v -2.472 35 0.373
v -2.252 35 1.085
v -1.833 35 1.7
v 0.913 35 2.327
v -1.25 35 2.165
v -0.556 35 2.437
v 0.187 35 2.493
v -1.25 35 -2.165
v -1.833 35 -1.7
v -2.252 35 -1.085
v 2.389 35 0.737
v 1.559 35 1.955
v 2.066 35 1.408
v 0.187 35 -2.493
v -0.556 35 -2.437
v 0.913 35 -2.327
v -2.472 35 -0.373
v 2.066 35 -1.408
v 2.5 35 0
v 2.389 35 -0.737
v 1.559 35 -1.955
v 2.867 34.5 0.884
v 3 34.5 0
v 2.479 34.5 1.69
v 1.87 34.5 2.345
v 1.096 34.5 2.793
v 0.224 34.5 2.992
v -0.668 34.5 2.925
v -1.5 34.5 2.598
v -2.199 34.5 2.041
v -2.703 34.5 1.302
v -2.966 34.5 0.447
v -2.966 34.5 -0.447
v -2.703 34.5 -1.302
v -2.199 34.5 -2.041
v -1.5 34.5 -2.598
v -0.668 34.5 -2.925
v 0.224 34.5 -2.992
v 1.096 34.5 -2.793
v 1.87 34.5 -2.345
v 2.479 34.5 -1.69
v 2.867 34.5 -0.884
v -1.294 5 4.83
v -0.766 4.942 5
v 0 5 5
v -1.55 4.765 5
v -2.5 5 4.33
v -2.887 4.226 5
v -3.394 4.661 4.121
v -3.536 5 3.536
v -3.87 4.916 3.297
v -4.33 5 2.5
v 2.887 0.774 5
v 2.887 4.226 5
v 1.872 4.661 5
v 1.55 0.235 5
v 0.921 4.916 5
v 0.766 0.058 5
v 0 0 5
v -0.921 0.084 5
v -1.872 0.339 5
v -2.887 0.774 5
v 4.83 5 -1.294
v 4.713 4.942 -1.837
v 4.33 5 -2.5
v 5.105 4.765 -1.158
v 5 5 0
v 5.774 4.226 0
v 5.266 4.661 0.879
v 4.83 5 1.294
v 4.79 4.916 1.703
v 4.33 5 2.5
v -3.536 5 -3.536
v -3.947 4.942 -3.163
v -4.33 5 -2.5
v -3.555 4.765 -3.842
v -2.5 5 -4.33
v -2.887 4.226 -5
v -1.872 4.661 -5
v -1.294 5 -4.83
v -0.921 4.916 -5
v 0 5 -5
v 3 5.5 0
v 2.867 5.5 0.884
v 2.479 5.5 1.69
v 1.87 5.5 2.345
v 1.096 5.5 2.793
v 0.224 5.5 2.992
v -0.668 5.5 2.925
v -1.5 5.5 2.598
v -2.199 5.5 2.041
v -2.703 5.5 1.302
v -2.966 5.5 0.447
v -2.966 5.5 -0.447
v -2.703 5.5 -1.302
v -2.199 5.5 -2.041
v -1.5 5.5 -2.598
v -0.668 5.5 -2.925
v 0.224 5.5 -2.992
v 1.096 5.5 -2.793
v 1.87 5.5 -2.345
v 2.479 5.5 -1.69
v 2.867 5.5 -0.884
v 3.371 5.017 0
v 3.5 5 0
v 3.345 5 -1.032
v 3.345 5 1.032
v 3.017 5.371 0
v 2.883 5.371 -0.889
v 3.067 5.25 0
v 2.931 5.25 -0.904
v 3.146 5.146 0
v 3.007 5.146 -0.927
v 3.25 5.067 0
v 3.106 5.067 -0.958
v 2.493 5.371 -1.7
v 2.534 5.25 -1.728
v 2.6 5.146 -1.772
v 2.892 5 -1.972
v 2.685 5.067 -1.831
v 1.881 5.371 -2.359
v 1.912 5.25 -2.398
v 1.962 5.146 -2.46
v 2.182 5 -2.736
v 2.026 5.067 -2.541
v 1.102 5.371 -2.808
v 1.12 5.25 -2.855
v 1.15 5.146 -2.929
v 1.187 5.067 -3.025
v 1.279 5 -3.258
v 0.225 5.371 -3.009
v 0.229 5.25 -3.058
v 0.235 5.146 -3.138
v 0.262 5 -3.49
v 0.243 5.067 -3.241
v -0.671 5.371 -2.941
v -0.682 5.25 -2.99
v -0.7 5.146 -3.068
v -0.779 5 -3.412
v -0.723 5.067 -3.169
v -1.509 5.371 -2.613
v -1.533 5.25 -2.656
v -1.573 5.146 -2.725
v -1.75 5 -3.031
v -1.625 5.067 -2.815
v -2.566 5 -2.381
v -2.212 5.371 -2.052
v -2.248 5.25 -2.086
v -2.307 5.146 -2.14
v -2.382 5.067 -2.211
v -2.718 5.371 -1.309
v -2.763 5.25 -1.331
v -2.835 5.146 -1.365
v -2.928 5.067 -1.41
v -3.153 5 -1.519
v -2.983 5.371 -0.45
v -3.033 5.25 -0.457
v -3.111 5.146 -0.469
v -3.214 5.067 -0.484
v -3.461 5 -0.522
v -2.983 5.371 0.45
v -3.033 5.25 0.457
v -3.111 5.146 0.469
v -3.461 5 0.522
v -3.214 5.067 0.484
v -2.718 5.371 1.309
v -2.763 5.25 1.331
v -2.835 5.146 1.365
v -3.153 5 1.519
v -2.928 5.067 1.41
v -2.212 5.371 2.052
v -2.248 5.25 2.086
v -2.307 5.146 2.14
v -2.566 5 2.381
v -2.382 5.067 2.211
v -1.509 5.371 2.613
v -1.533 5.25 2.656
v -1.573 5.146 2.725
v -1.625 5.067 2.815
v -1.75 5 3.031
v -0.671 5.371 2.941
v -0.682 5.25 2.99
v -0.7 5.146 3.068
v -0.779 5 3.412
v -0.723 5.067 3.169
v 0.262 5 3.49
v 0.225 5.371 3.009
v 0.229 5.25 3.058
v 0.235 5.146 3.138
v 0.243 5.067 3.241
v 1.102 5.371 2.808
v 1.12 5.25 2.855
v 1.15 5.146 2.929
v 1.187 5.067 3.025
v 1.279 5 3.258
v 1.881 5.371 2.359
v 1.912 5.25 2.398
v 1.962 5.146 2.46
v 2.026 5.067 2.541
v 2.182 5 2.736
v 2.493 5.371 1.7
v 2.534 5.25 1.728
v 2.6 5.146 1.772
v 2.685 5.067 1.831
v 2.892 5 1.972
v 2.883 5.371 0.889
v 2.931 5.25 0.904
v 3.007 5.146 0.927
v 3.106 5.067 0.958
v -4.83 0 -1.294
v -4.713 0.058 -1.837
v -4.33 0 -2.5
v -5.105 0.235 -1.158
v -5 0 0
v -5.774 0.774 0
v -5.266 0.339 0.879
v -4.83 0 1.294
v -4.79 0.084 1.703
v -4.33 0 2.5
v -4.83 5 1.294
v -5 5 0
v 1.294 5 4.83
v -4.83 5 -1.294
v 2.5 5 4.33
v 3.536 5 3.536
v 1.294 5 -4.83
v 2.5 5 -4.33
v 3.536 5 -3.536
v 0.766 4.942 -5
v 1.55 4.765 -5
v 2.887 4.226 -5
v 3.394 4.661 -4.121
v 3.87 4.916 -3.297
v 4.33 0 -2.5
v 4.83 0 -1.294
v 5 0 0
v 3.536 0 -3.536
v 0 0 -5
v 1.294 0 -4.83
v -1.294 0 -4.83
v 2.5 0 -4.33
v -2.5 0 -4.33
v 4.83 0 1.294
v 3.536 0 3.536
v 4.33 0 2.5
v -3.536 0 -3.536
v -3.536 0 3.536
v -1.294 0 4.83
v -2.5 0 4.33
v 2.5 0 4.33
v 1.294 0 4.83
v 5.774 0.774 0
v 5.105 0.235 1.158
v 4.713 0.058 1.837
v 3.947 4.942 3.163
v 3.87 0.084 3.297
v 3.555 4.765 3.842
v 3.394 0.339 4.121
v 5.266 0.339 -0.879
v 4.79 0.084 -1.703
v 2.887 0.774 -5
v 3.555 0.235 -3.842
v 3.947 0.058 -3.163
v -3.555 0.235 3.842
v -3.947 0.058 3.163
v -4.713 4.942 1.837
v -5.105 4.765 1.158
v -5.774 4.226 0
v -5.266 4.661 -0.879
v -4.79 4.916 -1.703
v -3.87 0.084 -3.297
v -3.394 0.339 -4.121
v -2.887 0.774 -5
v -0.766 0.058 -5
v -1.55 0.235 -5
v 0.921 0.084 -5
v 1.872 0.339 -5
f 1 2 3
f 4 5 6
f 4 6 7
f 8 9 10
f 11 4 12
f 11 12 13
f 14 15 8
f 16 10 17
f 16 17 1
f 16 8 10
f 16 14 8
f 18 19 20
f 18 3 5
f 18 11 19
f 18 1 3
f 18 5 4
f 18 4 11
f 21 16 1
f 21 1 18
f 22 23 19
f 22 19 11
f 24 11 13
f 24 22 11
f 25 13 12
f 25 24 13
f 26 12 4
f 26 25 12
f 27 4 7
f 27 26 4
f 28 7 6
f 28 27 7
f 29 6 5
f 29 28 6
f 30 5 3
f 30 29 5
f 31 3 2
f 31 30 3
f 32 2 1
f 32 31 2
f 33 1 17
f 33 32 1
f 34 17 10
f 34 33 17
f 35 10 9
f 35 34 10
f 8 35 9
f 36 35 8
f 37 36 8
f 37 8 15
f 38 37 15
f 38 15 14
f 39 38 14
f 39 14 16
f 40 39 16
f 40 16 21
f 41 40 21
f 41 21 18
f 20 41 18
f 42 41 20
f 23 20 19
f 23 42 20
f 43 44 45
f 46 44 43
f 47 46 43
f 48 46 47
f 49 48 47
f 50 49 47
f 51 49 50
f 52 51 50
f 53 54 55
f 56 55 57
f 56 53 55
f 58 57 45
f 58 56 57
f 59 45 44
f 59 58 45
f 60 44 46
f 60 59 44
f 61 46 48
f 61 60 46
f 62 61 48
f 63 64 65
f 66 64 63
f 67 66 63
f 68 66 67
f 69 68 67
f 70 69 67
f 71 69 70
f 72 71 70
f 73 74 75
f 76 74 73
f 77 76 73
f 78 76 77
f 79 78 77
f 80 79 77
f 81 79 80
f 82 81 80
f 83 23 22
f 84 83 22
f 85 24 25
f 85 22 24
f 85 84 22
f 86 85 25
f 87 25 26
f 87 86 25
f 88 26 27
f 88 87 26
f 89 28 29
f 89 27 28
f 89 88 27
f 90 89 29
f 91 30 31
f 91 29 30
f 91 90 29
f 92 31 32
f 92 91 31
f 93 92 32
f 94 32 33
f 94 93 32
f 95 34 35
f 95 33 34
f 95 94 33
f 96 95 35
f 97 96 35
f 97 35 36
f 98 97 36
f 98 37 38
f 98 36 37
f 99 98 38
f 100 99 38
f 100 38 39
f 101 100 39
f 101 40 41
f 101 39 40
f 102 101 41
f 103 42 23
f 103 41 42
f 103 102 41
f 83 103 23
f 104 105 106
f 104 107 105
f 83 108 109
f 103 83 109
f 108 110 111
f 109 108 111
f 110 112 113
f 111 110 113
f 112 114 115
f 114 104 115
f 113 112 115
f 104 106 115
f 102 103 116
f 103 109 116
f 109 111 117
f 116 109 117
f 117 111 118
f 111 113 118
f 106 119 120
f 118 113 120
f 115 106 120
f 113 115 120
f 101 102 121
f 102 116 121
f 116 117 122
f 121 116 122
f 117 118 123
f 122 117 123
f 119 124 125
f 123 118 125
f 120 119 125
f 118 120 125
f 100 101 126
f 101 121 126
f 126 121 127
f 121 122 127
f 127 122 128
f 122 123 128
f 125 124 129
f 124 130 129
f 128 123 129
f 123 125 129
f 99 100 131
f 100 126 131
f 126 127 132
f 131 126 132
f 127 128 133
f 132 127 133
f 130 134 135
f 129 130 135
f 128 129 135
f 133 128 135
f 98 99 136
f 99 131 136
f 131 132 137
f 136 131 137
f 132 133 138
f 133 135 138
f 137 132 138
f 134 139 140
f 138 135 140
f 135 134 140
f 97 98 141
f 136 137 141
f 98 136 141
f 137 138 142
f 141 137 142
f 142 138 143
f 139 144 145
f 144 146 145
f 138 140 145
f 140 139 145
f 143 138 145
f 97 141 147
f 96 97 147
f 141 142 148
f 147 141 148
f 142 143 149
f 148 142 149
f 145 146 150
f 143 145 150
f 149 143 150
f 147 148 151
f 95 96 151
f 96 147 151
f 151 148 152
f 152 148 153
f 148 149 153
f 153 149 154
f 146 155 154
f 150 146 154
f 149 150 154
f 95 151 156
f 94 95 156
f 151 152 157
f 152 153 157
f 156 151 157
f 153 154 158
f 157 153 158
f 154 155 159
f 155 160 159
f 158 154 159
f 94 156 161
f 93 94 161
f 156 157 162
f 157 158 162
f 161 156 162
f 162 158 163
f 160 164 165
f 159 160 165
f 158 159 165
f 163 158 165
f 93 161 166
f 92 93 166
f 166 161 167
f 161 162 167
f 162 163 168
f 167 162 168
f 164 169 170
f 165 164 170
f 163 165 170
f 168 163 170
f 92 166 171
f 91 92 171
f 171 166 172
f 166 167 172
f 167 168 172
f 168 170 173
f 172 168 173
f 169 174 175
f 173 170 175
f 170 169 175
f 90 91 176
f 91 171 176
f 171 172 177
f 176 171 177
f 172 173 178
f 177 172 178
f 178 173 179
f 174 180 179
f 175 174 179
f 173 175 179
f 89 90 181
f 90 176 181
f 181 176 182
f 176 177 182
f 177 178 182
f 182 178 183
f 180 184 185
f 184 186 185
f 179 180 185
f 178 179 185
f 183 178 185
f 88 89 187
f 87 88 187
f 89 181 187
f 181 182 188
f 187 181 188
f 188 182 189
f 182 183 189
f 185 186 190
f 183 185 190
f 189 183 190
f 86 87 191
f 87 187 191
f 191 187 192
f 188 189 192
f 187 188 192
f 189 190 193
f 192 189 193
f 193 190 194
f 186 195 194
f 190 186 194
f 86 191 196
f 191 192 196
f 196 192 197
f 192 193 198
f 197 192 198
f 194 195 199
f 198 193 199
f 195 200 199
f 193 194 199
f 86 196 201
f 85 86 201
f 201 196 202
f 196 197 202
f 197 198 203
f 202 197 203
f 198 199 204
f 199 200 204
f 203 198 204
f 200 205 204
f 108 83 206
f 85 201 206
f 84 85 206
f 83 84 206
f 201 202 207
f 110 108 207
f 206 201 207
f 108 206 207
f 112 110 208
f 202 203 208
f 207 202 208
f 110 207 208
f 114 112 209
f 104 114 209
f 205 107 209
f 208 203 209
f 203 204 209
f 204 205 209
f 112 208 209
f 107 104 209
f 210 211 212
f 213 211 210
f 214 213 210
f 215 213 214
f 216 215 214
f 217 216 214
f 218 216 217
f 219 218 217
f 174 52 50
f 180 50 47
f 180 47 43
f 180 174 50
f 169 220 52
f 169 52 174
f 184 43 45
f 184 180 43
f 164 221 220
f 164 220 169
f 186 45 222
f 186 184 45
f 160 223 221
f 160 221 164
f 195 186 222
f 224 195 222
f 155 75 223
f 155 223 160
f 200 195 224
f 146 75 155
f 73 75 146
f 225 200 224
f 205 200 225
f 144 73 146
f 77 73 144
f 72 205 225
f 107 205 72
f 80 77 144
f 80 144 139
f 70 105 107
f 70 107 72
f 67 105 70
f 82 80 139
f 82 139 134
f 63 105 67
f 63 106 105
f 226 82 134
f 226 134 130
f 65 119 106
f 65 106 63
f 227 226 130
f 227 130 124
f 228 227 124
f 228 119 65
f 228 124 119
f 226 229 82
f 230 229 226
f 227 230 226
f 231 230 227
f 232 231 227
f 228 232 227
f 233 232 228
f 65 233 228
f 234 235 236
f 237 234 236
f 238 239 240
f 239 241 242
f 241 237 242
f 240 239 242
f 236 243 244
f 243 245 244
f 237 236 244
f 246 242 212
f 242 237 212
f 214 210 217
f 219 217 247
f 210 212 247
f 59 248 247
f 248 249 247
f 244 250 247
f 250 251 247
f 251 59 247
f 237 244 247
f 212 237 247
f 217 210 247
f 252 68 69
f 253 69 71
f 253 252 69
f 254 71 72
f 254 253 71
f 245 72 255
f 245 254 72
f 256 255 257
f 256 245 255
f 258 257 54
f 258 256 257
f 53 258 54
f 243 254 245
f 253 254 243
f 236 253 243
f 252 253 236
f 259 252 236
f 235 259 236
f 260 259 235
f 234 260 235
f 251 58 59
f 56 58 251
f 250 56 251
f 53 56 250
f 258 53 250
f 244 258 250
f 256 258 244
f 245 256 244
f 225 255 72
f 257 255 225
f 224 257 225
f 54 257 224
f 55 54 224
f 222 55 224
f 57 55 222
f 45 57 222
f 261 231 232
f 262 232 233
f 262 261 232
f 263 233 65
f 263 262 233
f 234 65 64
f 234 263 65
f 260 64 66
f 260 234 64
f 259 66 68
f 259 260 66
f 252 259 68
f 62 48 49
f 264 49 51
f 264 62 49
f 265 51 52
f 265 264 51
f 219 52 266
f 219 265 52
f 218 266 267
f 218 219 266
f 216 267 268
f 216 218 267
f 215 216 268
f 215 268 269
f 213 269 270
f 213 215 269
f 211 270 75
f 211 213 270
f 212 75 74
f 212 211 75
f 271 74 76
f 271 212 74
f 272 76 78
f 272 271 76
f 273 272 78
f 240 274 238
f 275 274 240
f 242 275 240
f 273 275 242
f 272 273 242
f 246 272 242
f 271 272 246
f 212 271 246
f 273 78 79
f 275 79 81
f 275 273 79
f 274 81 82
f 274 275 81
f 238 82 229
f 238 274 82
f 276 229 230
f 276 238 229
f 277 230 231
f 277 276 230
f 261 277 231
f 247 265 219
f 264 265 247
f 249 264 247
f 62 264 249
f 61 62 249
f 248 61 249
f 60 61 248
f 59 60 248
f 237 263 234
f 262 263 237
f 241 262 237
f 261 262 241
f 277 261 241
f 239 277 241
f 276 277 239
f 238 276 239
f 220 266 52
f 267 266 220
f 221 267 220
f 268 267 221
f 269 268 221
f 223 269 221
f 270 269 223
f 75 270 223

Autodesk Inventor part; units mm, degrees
ref_plane "YZ Plane" through (0, 0, 0) normal (1, 0, 0) x (0, 1, 0)
ref_plane "XZ Plane" through (0, 0, 0) normal (0, 1, 0) x (-1, 0, 0)
ref_plane "XY Plane" through (0, 0, 0) normal (0, 0, 1) x (1, 0, 0)
sketch "Esboço1" plane through (0, 0, 0) normal (0, 1, 0) x (-1, 0, 0)
  circle A0 centre (0, 0) radius 3
  line L0 (-2.8868, -5) -> (-5.7735, 0)
  line L1 (-5.7735, 0) -> (-2.8868, 5)
  line L2 (-2.8868, 5) -> (2.8868, 5)
  line L3 (2.8868, 5) -> (5.7735, 0)
  line L4 (5.7735, 0) -> (2.8868, -5)
  line L5 (2.8868, -5) -> (-2.8868, -5)
  dimension "d0" = 6
extrude "Extrusão1" add sketch "Esboço1" along normal blind 5
sketch "Esboço2" plane through (0, 0, 0) normal (1, 0, 0) x (0, 1, 0)
  point P0 (0, 0)
chamfer "Chanfro1" distance 0.5 angle 45 2 edges at (3, 0, 0) (3, 5, 0)
sketch "Esboço5" plane through (0, 0, 0) normal (0, -1, 0) x (1, 0, 0)
  circle A0 centre (0, 0) radius 5
extrude "Extrusão2" cut sketch "Esboço5" against normal through all draft 45 keep common part
sketch "Esboço6" plane through (0, 5, 0) normal (0, 1, 0) x (1, 0, 0)
  circle A0 centre (0, 0) radius 5
extrude "Extrusão3" cut sketch "Esboço6" against normal through all draft 45 keep common part
sketch "Esboço7" plane through (0, 5, 0) normal (0, 1, 0) x (1, 0, 0)
  circle A0 centre (0, 0) radius 3.5
extrude "Extrusão4" add sketch "Esboço7" against normal blind 5
sketch "Esboço8" plane through (0, 5, 0) normal (0, 1, 0) x (1, 0, 0)
  circle A0 centre (0, 0) radius 3
  dimension "d16" = 6
extrude "Extrusão5" add sketch "Esboço8" along normal blind 30
chamfer "Chanfro2" distance 0.5 angle 45 1 edges at (-3, 35, 0)
fillet "Arredondamento1" radius 0.5 1 edges at (-3, 5, 0)
thread "Rosca2" size "M6x1" class "6g" standard "ANSI Metric M Profile" full length
properties part number "porca m6" material "Aço inoxidável"
